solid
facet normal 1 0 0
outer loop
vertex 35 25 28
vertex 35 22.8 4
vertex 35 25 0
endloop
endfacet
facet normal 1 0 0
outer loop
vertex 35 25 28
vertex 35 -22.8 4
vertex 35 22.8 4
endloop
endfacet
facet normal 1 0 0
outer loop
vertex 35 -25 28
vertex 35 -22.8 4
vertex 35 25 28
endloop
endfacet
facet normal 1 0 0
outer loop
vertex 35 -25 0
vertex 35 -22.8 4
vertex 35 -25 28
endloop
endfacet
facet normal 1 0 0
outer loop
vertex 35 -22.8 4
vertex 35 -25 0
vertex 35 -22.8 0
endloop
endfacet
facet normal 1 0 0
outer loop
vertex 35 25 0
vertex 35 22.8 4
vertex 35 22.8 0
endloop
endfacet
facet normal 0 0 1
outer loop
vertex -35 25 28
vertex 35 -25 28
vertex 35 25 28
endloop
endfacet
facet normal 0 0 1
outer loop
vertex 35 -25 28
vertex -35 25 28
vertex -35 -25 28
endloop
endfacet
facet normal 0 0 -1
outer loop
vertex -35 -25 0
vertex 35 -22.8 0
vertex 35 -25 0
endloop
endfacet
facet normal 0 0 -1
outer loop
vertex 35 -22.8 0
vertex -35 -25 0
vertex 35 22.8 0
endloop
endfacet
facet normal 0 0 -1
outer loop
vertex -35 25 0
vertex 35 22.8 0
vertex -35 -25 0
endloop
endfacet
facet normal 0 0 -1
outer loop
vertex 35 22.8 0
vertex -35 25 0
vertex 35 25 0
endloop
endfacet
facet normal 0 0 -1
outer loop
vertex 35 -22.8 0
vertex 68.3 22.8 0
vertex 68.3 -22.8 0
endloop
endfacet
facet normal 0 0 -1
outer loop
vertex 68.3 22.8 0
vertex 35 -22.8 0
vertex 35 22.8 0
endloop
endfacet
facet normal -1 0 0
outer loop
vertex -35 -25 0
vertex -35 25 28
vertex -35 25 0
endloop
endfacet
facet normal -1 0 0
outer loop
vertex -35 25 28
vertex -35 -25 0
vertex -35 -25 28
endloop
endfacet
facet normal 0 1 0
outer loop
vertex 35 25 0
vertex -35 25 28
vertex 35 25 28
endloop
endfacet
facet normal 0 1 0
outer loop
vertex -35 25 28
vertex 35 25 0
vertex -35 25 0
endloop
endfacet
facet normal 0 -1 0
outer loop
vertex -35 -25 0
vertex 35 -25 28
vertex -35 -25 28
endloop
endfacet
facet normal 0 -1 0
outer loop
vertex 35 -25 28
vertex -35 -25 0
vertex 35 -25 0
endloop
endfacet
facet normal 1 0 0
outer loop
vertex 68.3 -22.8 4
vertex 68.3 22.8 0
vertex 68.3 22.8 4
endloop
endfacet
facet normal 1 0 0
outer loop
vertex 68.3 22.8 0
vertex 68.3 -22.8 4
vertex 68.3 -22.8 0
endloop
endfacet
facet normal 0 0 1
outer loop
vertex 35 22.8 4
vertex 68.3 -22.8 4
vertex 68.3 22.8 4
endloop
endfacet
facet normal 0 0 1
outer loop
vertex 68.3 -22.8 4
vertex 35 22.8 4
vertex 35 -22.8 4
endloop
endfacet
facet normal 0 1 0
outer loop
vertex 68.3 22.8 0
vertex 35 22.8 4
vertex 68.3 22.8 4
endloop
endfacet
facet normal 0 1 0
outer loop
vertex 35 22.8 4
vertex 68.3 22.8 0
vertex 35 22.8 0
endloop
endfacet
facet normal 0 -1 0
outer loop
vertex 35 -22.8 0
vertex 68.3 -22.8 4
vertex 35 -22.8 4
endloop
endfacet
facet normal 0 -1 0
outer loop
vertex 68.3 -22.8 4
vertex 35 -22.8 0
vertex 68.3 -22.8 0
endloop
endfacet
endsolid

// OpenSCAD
// Two-part enclosure for a small electronics board (e.g. Arduino-based temperature logger)
// Print orientation: box stands on its floor, lid rests on the bed upside down with a lip
// so the two parts fuse into one solid.

// ---------------- Parameters ----------------
box_x      = 70;    // box outer length (X)
box_y      = 50;    // box outer width (Y)
box_z      = 30;    // box outer height (Z)
wall       = 2;     // box wall thickness
floor      = 2;     // box floor thickness (separate from walls)

lip_t      = 1.5;   // lid wall thickness
lip_h      = 4;     // lid wall height (extends above the plate)
lip_x      = 65.6;  // lid outer length (X)
lip_y      = 45.6;  // lid outer width (Y)
clearance  = 0.2;   // clearance between lip inner size and box opening

eps        = 0.5;   // overlap / cut extension to avoid coplanar faces

// ---------------- Model ----------------
union() {
    // Box (Part 1)
    translate([-box_x/2, -box_y/2, 0])
        cube([box_x, box_y, box_z - floor]);

    // Lid (Part 2), printed upside down, placed on the +X side of the box
    translate([(box_x - lip_x)/2 + eps, -lip_y/2, 0])
        cube([lip_x, lip_y, lip_h]);
}
